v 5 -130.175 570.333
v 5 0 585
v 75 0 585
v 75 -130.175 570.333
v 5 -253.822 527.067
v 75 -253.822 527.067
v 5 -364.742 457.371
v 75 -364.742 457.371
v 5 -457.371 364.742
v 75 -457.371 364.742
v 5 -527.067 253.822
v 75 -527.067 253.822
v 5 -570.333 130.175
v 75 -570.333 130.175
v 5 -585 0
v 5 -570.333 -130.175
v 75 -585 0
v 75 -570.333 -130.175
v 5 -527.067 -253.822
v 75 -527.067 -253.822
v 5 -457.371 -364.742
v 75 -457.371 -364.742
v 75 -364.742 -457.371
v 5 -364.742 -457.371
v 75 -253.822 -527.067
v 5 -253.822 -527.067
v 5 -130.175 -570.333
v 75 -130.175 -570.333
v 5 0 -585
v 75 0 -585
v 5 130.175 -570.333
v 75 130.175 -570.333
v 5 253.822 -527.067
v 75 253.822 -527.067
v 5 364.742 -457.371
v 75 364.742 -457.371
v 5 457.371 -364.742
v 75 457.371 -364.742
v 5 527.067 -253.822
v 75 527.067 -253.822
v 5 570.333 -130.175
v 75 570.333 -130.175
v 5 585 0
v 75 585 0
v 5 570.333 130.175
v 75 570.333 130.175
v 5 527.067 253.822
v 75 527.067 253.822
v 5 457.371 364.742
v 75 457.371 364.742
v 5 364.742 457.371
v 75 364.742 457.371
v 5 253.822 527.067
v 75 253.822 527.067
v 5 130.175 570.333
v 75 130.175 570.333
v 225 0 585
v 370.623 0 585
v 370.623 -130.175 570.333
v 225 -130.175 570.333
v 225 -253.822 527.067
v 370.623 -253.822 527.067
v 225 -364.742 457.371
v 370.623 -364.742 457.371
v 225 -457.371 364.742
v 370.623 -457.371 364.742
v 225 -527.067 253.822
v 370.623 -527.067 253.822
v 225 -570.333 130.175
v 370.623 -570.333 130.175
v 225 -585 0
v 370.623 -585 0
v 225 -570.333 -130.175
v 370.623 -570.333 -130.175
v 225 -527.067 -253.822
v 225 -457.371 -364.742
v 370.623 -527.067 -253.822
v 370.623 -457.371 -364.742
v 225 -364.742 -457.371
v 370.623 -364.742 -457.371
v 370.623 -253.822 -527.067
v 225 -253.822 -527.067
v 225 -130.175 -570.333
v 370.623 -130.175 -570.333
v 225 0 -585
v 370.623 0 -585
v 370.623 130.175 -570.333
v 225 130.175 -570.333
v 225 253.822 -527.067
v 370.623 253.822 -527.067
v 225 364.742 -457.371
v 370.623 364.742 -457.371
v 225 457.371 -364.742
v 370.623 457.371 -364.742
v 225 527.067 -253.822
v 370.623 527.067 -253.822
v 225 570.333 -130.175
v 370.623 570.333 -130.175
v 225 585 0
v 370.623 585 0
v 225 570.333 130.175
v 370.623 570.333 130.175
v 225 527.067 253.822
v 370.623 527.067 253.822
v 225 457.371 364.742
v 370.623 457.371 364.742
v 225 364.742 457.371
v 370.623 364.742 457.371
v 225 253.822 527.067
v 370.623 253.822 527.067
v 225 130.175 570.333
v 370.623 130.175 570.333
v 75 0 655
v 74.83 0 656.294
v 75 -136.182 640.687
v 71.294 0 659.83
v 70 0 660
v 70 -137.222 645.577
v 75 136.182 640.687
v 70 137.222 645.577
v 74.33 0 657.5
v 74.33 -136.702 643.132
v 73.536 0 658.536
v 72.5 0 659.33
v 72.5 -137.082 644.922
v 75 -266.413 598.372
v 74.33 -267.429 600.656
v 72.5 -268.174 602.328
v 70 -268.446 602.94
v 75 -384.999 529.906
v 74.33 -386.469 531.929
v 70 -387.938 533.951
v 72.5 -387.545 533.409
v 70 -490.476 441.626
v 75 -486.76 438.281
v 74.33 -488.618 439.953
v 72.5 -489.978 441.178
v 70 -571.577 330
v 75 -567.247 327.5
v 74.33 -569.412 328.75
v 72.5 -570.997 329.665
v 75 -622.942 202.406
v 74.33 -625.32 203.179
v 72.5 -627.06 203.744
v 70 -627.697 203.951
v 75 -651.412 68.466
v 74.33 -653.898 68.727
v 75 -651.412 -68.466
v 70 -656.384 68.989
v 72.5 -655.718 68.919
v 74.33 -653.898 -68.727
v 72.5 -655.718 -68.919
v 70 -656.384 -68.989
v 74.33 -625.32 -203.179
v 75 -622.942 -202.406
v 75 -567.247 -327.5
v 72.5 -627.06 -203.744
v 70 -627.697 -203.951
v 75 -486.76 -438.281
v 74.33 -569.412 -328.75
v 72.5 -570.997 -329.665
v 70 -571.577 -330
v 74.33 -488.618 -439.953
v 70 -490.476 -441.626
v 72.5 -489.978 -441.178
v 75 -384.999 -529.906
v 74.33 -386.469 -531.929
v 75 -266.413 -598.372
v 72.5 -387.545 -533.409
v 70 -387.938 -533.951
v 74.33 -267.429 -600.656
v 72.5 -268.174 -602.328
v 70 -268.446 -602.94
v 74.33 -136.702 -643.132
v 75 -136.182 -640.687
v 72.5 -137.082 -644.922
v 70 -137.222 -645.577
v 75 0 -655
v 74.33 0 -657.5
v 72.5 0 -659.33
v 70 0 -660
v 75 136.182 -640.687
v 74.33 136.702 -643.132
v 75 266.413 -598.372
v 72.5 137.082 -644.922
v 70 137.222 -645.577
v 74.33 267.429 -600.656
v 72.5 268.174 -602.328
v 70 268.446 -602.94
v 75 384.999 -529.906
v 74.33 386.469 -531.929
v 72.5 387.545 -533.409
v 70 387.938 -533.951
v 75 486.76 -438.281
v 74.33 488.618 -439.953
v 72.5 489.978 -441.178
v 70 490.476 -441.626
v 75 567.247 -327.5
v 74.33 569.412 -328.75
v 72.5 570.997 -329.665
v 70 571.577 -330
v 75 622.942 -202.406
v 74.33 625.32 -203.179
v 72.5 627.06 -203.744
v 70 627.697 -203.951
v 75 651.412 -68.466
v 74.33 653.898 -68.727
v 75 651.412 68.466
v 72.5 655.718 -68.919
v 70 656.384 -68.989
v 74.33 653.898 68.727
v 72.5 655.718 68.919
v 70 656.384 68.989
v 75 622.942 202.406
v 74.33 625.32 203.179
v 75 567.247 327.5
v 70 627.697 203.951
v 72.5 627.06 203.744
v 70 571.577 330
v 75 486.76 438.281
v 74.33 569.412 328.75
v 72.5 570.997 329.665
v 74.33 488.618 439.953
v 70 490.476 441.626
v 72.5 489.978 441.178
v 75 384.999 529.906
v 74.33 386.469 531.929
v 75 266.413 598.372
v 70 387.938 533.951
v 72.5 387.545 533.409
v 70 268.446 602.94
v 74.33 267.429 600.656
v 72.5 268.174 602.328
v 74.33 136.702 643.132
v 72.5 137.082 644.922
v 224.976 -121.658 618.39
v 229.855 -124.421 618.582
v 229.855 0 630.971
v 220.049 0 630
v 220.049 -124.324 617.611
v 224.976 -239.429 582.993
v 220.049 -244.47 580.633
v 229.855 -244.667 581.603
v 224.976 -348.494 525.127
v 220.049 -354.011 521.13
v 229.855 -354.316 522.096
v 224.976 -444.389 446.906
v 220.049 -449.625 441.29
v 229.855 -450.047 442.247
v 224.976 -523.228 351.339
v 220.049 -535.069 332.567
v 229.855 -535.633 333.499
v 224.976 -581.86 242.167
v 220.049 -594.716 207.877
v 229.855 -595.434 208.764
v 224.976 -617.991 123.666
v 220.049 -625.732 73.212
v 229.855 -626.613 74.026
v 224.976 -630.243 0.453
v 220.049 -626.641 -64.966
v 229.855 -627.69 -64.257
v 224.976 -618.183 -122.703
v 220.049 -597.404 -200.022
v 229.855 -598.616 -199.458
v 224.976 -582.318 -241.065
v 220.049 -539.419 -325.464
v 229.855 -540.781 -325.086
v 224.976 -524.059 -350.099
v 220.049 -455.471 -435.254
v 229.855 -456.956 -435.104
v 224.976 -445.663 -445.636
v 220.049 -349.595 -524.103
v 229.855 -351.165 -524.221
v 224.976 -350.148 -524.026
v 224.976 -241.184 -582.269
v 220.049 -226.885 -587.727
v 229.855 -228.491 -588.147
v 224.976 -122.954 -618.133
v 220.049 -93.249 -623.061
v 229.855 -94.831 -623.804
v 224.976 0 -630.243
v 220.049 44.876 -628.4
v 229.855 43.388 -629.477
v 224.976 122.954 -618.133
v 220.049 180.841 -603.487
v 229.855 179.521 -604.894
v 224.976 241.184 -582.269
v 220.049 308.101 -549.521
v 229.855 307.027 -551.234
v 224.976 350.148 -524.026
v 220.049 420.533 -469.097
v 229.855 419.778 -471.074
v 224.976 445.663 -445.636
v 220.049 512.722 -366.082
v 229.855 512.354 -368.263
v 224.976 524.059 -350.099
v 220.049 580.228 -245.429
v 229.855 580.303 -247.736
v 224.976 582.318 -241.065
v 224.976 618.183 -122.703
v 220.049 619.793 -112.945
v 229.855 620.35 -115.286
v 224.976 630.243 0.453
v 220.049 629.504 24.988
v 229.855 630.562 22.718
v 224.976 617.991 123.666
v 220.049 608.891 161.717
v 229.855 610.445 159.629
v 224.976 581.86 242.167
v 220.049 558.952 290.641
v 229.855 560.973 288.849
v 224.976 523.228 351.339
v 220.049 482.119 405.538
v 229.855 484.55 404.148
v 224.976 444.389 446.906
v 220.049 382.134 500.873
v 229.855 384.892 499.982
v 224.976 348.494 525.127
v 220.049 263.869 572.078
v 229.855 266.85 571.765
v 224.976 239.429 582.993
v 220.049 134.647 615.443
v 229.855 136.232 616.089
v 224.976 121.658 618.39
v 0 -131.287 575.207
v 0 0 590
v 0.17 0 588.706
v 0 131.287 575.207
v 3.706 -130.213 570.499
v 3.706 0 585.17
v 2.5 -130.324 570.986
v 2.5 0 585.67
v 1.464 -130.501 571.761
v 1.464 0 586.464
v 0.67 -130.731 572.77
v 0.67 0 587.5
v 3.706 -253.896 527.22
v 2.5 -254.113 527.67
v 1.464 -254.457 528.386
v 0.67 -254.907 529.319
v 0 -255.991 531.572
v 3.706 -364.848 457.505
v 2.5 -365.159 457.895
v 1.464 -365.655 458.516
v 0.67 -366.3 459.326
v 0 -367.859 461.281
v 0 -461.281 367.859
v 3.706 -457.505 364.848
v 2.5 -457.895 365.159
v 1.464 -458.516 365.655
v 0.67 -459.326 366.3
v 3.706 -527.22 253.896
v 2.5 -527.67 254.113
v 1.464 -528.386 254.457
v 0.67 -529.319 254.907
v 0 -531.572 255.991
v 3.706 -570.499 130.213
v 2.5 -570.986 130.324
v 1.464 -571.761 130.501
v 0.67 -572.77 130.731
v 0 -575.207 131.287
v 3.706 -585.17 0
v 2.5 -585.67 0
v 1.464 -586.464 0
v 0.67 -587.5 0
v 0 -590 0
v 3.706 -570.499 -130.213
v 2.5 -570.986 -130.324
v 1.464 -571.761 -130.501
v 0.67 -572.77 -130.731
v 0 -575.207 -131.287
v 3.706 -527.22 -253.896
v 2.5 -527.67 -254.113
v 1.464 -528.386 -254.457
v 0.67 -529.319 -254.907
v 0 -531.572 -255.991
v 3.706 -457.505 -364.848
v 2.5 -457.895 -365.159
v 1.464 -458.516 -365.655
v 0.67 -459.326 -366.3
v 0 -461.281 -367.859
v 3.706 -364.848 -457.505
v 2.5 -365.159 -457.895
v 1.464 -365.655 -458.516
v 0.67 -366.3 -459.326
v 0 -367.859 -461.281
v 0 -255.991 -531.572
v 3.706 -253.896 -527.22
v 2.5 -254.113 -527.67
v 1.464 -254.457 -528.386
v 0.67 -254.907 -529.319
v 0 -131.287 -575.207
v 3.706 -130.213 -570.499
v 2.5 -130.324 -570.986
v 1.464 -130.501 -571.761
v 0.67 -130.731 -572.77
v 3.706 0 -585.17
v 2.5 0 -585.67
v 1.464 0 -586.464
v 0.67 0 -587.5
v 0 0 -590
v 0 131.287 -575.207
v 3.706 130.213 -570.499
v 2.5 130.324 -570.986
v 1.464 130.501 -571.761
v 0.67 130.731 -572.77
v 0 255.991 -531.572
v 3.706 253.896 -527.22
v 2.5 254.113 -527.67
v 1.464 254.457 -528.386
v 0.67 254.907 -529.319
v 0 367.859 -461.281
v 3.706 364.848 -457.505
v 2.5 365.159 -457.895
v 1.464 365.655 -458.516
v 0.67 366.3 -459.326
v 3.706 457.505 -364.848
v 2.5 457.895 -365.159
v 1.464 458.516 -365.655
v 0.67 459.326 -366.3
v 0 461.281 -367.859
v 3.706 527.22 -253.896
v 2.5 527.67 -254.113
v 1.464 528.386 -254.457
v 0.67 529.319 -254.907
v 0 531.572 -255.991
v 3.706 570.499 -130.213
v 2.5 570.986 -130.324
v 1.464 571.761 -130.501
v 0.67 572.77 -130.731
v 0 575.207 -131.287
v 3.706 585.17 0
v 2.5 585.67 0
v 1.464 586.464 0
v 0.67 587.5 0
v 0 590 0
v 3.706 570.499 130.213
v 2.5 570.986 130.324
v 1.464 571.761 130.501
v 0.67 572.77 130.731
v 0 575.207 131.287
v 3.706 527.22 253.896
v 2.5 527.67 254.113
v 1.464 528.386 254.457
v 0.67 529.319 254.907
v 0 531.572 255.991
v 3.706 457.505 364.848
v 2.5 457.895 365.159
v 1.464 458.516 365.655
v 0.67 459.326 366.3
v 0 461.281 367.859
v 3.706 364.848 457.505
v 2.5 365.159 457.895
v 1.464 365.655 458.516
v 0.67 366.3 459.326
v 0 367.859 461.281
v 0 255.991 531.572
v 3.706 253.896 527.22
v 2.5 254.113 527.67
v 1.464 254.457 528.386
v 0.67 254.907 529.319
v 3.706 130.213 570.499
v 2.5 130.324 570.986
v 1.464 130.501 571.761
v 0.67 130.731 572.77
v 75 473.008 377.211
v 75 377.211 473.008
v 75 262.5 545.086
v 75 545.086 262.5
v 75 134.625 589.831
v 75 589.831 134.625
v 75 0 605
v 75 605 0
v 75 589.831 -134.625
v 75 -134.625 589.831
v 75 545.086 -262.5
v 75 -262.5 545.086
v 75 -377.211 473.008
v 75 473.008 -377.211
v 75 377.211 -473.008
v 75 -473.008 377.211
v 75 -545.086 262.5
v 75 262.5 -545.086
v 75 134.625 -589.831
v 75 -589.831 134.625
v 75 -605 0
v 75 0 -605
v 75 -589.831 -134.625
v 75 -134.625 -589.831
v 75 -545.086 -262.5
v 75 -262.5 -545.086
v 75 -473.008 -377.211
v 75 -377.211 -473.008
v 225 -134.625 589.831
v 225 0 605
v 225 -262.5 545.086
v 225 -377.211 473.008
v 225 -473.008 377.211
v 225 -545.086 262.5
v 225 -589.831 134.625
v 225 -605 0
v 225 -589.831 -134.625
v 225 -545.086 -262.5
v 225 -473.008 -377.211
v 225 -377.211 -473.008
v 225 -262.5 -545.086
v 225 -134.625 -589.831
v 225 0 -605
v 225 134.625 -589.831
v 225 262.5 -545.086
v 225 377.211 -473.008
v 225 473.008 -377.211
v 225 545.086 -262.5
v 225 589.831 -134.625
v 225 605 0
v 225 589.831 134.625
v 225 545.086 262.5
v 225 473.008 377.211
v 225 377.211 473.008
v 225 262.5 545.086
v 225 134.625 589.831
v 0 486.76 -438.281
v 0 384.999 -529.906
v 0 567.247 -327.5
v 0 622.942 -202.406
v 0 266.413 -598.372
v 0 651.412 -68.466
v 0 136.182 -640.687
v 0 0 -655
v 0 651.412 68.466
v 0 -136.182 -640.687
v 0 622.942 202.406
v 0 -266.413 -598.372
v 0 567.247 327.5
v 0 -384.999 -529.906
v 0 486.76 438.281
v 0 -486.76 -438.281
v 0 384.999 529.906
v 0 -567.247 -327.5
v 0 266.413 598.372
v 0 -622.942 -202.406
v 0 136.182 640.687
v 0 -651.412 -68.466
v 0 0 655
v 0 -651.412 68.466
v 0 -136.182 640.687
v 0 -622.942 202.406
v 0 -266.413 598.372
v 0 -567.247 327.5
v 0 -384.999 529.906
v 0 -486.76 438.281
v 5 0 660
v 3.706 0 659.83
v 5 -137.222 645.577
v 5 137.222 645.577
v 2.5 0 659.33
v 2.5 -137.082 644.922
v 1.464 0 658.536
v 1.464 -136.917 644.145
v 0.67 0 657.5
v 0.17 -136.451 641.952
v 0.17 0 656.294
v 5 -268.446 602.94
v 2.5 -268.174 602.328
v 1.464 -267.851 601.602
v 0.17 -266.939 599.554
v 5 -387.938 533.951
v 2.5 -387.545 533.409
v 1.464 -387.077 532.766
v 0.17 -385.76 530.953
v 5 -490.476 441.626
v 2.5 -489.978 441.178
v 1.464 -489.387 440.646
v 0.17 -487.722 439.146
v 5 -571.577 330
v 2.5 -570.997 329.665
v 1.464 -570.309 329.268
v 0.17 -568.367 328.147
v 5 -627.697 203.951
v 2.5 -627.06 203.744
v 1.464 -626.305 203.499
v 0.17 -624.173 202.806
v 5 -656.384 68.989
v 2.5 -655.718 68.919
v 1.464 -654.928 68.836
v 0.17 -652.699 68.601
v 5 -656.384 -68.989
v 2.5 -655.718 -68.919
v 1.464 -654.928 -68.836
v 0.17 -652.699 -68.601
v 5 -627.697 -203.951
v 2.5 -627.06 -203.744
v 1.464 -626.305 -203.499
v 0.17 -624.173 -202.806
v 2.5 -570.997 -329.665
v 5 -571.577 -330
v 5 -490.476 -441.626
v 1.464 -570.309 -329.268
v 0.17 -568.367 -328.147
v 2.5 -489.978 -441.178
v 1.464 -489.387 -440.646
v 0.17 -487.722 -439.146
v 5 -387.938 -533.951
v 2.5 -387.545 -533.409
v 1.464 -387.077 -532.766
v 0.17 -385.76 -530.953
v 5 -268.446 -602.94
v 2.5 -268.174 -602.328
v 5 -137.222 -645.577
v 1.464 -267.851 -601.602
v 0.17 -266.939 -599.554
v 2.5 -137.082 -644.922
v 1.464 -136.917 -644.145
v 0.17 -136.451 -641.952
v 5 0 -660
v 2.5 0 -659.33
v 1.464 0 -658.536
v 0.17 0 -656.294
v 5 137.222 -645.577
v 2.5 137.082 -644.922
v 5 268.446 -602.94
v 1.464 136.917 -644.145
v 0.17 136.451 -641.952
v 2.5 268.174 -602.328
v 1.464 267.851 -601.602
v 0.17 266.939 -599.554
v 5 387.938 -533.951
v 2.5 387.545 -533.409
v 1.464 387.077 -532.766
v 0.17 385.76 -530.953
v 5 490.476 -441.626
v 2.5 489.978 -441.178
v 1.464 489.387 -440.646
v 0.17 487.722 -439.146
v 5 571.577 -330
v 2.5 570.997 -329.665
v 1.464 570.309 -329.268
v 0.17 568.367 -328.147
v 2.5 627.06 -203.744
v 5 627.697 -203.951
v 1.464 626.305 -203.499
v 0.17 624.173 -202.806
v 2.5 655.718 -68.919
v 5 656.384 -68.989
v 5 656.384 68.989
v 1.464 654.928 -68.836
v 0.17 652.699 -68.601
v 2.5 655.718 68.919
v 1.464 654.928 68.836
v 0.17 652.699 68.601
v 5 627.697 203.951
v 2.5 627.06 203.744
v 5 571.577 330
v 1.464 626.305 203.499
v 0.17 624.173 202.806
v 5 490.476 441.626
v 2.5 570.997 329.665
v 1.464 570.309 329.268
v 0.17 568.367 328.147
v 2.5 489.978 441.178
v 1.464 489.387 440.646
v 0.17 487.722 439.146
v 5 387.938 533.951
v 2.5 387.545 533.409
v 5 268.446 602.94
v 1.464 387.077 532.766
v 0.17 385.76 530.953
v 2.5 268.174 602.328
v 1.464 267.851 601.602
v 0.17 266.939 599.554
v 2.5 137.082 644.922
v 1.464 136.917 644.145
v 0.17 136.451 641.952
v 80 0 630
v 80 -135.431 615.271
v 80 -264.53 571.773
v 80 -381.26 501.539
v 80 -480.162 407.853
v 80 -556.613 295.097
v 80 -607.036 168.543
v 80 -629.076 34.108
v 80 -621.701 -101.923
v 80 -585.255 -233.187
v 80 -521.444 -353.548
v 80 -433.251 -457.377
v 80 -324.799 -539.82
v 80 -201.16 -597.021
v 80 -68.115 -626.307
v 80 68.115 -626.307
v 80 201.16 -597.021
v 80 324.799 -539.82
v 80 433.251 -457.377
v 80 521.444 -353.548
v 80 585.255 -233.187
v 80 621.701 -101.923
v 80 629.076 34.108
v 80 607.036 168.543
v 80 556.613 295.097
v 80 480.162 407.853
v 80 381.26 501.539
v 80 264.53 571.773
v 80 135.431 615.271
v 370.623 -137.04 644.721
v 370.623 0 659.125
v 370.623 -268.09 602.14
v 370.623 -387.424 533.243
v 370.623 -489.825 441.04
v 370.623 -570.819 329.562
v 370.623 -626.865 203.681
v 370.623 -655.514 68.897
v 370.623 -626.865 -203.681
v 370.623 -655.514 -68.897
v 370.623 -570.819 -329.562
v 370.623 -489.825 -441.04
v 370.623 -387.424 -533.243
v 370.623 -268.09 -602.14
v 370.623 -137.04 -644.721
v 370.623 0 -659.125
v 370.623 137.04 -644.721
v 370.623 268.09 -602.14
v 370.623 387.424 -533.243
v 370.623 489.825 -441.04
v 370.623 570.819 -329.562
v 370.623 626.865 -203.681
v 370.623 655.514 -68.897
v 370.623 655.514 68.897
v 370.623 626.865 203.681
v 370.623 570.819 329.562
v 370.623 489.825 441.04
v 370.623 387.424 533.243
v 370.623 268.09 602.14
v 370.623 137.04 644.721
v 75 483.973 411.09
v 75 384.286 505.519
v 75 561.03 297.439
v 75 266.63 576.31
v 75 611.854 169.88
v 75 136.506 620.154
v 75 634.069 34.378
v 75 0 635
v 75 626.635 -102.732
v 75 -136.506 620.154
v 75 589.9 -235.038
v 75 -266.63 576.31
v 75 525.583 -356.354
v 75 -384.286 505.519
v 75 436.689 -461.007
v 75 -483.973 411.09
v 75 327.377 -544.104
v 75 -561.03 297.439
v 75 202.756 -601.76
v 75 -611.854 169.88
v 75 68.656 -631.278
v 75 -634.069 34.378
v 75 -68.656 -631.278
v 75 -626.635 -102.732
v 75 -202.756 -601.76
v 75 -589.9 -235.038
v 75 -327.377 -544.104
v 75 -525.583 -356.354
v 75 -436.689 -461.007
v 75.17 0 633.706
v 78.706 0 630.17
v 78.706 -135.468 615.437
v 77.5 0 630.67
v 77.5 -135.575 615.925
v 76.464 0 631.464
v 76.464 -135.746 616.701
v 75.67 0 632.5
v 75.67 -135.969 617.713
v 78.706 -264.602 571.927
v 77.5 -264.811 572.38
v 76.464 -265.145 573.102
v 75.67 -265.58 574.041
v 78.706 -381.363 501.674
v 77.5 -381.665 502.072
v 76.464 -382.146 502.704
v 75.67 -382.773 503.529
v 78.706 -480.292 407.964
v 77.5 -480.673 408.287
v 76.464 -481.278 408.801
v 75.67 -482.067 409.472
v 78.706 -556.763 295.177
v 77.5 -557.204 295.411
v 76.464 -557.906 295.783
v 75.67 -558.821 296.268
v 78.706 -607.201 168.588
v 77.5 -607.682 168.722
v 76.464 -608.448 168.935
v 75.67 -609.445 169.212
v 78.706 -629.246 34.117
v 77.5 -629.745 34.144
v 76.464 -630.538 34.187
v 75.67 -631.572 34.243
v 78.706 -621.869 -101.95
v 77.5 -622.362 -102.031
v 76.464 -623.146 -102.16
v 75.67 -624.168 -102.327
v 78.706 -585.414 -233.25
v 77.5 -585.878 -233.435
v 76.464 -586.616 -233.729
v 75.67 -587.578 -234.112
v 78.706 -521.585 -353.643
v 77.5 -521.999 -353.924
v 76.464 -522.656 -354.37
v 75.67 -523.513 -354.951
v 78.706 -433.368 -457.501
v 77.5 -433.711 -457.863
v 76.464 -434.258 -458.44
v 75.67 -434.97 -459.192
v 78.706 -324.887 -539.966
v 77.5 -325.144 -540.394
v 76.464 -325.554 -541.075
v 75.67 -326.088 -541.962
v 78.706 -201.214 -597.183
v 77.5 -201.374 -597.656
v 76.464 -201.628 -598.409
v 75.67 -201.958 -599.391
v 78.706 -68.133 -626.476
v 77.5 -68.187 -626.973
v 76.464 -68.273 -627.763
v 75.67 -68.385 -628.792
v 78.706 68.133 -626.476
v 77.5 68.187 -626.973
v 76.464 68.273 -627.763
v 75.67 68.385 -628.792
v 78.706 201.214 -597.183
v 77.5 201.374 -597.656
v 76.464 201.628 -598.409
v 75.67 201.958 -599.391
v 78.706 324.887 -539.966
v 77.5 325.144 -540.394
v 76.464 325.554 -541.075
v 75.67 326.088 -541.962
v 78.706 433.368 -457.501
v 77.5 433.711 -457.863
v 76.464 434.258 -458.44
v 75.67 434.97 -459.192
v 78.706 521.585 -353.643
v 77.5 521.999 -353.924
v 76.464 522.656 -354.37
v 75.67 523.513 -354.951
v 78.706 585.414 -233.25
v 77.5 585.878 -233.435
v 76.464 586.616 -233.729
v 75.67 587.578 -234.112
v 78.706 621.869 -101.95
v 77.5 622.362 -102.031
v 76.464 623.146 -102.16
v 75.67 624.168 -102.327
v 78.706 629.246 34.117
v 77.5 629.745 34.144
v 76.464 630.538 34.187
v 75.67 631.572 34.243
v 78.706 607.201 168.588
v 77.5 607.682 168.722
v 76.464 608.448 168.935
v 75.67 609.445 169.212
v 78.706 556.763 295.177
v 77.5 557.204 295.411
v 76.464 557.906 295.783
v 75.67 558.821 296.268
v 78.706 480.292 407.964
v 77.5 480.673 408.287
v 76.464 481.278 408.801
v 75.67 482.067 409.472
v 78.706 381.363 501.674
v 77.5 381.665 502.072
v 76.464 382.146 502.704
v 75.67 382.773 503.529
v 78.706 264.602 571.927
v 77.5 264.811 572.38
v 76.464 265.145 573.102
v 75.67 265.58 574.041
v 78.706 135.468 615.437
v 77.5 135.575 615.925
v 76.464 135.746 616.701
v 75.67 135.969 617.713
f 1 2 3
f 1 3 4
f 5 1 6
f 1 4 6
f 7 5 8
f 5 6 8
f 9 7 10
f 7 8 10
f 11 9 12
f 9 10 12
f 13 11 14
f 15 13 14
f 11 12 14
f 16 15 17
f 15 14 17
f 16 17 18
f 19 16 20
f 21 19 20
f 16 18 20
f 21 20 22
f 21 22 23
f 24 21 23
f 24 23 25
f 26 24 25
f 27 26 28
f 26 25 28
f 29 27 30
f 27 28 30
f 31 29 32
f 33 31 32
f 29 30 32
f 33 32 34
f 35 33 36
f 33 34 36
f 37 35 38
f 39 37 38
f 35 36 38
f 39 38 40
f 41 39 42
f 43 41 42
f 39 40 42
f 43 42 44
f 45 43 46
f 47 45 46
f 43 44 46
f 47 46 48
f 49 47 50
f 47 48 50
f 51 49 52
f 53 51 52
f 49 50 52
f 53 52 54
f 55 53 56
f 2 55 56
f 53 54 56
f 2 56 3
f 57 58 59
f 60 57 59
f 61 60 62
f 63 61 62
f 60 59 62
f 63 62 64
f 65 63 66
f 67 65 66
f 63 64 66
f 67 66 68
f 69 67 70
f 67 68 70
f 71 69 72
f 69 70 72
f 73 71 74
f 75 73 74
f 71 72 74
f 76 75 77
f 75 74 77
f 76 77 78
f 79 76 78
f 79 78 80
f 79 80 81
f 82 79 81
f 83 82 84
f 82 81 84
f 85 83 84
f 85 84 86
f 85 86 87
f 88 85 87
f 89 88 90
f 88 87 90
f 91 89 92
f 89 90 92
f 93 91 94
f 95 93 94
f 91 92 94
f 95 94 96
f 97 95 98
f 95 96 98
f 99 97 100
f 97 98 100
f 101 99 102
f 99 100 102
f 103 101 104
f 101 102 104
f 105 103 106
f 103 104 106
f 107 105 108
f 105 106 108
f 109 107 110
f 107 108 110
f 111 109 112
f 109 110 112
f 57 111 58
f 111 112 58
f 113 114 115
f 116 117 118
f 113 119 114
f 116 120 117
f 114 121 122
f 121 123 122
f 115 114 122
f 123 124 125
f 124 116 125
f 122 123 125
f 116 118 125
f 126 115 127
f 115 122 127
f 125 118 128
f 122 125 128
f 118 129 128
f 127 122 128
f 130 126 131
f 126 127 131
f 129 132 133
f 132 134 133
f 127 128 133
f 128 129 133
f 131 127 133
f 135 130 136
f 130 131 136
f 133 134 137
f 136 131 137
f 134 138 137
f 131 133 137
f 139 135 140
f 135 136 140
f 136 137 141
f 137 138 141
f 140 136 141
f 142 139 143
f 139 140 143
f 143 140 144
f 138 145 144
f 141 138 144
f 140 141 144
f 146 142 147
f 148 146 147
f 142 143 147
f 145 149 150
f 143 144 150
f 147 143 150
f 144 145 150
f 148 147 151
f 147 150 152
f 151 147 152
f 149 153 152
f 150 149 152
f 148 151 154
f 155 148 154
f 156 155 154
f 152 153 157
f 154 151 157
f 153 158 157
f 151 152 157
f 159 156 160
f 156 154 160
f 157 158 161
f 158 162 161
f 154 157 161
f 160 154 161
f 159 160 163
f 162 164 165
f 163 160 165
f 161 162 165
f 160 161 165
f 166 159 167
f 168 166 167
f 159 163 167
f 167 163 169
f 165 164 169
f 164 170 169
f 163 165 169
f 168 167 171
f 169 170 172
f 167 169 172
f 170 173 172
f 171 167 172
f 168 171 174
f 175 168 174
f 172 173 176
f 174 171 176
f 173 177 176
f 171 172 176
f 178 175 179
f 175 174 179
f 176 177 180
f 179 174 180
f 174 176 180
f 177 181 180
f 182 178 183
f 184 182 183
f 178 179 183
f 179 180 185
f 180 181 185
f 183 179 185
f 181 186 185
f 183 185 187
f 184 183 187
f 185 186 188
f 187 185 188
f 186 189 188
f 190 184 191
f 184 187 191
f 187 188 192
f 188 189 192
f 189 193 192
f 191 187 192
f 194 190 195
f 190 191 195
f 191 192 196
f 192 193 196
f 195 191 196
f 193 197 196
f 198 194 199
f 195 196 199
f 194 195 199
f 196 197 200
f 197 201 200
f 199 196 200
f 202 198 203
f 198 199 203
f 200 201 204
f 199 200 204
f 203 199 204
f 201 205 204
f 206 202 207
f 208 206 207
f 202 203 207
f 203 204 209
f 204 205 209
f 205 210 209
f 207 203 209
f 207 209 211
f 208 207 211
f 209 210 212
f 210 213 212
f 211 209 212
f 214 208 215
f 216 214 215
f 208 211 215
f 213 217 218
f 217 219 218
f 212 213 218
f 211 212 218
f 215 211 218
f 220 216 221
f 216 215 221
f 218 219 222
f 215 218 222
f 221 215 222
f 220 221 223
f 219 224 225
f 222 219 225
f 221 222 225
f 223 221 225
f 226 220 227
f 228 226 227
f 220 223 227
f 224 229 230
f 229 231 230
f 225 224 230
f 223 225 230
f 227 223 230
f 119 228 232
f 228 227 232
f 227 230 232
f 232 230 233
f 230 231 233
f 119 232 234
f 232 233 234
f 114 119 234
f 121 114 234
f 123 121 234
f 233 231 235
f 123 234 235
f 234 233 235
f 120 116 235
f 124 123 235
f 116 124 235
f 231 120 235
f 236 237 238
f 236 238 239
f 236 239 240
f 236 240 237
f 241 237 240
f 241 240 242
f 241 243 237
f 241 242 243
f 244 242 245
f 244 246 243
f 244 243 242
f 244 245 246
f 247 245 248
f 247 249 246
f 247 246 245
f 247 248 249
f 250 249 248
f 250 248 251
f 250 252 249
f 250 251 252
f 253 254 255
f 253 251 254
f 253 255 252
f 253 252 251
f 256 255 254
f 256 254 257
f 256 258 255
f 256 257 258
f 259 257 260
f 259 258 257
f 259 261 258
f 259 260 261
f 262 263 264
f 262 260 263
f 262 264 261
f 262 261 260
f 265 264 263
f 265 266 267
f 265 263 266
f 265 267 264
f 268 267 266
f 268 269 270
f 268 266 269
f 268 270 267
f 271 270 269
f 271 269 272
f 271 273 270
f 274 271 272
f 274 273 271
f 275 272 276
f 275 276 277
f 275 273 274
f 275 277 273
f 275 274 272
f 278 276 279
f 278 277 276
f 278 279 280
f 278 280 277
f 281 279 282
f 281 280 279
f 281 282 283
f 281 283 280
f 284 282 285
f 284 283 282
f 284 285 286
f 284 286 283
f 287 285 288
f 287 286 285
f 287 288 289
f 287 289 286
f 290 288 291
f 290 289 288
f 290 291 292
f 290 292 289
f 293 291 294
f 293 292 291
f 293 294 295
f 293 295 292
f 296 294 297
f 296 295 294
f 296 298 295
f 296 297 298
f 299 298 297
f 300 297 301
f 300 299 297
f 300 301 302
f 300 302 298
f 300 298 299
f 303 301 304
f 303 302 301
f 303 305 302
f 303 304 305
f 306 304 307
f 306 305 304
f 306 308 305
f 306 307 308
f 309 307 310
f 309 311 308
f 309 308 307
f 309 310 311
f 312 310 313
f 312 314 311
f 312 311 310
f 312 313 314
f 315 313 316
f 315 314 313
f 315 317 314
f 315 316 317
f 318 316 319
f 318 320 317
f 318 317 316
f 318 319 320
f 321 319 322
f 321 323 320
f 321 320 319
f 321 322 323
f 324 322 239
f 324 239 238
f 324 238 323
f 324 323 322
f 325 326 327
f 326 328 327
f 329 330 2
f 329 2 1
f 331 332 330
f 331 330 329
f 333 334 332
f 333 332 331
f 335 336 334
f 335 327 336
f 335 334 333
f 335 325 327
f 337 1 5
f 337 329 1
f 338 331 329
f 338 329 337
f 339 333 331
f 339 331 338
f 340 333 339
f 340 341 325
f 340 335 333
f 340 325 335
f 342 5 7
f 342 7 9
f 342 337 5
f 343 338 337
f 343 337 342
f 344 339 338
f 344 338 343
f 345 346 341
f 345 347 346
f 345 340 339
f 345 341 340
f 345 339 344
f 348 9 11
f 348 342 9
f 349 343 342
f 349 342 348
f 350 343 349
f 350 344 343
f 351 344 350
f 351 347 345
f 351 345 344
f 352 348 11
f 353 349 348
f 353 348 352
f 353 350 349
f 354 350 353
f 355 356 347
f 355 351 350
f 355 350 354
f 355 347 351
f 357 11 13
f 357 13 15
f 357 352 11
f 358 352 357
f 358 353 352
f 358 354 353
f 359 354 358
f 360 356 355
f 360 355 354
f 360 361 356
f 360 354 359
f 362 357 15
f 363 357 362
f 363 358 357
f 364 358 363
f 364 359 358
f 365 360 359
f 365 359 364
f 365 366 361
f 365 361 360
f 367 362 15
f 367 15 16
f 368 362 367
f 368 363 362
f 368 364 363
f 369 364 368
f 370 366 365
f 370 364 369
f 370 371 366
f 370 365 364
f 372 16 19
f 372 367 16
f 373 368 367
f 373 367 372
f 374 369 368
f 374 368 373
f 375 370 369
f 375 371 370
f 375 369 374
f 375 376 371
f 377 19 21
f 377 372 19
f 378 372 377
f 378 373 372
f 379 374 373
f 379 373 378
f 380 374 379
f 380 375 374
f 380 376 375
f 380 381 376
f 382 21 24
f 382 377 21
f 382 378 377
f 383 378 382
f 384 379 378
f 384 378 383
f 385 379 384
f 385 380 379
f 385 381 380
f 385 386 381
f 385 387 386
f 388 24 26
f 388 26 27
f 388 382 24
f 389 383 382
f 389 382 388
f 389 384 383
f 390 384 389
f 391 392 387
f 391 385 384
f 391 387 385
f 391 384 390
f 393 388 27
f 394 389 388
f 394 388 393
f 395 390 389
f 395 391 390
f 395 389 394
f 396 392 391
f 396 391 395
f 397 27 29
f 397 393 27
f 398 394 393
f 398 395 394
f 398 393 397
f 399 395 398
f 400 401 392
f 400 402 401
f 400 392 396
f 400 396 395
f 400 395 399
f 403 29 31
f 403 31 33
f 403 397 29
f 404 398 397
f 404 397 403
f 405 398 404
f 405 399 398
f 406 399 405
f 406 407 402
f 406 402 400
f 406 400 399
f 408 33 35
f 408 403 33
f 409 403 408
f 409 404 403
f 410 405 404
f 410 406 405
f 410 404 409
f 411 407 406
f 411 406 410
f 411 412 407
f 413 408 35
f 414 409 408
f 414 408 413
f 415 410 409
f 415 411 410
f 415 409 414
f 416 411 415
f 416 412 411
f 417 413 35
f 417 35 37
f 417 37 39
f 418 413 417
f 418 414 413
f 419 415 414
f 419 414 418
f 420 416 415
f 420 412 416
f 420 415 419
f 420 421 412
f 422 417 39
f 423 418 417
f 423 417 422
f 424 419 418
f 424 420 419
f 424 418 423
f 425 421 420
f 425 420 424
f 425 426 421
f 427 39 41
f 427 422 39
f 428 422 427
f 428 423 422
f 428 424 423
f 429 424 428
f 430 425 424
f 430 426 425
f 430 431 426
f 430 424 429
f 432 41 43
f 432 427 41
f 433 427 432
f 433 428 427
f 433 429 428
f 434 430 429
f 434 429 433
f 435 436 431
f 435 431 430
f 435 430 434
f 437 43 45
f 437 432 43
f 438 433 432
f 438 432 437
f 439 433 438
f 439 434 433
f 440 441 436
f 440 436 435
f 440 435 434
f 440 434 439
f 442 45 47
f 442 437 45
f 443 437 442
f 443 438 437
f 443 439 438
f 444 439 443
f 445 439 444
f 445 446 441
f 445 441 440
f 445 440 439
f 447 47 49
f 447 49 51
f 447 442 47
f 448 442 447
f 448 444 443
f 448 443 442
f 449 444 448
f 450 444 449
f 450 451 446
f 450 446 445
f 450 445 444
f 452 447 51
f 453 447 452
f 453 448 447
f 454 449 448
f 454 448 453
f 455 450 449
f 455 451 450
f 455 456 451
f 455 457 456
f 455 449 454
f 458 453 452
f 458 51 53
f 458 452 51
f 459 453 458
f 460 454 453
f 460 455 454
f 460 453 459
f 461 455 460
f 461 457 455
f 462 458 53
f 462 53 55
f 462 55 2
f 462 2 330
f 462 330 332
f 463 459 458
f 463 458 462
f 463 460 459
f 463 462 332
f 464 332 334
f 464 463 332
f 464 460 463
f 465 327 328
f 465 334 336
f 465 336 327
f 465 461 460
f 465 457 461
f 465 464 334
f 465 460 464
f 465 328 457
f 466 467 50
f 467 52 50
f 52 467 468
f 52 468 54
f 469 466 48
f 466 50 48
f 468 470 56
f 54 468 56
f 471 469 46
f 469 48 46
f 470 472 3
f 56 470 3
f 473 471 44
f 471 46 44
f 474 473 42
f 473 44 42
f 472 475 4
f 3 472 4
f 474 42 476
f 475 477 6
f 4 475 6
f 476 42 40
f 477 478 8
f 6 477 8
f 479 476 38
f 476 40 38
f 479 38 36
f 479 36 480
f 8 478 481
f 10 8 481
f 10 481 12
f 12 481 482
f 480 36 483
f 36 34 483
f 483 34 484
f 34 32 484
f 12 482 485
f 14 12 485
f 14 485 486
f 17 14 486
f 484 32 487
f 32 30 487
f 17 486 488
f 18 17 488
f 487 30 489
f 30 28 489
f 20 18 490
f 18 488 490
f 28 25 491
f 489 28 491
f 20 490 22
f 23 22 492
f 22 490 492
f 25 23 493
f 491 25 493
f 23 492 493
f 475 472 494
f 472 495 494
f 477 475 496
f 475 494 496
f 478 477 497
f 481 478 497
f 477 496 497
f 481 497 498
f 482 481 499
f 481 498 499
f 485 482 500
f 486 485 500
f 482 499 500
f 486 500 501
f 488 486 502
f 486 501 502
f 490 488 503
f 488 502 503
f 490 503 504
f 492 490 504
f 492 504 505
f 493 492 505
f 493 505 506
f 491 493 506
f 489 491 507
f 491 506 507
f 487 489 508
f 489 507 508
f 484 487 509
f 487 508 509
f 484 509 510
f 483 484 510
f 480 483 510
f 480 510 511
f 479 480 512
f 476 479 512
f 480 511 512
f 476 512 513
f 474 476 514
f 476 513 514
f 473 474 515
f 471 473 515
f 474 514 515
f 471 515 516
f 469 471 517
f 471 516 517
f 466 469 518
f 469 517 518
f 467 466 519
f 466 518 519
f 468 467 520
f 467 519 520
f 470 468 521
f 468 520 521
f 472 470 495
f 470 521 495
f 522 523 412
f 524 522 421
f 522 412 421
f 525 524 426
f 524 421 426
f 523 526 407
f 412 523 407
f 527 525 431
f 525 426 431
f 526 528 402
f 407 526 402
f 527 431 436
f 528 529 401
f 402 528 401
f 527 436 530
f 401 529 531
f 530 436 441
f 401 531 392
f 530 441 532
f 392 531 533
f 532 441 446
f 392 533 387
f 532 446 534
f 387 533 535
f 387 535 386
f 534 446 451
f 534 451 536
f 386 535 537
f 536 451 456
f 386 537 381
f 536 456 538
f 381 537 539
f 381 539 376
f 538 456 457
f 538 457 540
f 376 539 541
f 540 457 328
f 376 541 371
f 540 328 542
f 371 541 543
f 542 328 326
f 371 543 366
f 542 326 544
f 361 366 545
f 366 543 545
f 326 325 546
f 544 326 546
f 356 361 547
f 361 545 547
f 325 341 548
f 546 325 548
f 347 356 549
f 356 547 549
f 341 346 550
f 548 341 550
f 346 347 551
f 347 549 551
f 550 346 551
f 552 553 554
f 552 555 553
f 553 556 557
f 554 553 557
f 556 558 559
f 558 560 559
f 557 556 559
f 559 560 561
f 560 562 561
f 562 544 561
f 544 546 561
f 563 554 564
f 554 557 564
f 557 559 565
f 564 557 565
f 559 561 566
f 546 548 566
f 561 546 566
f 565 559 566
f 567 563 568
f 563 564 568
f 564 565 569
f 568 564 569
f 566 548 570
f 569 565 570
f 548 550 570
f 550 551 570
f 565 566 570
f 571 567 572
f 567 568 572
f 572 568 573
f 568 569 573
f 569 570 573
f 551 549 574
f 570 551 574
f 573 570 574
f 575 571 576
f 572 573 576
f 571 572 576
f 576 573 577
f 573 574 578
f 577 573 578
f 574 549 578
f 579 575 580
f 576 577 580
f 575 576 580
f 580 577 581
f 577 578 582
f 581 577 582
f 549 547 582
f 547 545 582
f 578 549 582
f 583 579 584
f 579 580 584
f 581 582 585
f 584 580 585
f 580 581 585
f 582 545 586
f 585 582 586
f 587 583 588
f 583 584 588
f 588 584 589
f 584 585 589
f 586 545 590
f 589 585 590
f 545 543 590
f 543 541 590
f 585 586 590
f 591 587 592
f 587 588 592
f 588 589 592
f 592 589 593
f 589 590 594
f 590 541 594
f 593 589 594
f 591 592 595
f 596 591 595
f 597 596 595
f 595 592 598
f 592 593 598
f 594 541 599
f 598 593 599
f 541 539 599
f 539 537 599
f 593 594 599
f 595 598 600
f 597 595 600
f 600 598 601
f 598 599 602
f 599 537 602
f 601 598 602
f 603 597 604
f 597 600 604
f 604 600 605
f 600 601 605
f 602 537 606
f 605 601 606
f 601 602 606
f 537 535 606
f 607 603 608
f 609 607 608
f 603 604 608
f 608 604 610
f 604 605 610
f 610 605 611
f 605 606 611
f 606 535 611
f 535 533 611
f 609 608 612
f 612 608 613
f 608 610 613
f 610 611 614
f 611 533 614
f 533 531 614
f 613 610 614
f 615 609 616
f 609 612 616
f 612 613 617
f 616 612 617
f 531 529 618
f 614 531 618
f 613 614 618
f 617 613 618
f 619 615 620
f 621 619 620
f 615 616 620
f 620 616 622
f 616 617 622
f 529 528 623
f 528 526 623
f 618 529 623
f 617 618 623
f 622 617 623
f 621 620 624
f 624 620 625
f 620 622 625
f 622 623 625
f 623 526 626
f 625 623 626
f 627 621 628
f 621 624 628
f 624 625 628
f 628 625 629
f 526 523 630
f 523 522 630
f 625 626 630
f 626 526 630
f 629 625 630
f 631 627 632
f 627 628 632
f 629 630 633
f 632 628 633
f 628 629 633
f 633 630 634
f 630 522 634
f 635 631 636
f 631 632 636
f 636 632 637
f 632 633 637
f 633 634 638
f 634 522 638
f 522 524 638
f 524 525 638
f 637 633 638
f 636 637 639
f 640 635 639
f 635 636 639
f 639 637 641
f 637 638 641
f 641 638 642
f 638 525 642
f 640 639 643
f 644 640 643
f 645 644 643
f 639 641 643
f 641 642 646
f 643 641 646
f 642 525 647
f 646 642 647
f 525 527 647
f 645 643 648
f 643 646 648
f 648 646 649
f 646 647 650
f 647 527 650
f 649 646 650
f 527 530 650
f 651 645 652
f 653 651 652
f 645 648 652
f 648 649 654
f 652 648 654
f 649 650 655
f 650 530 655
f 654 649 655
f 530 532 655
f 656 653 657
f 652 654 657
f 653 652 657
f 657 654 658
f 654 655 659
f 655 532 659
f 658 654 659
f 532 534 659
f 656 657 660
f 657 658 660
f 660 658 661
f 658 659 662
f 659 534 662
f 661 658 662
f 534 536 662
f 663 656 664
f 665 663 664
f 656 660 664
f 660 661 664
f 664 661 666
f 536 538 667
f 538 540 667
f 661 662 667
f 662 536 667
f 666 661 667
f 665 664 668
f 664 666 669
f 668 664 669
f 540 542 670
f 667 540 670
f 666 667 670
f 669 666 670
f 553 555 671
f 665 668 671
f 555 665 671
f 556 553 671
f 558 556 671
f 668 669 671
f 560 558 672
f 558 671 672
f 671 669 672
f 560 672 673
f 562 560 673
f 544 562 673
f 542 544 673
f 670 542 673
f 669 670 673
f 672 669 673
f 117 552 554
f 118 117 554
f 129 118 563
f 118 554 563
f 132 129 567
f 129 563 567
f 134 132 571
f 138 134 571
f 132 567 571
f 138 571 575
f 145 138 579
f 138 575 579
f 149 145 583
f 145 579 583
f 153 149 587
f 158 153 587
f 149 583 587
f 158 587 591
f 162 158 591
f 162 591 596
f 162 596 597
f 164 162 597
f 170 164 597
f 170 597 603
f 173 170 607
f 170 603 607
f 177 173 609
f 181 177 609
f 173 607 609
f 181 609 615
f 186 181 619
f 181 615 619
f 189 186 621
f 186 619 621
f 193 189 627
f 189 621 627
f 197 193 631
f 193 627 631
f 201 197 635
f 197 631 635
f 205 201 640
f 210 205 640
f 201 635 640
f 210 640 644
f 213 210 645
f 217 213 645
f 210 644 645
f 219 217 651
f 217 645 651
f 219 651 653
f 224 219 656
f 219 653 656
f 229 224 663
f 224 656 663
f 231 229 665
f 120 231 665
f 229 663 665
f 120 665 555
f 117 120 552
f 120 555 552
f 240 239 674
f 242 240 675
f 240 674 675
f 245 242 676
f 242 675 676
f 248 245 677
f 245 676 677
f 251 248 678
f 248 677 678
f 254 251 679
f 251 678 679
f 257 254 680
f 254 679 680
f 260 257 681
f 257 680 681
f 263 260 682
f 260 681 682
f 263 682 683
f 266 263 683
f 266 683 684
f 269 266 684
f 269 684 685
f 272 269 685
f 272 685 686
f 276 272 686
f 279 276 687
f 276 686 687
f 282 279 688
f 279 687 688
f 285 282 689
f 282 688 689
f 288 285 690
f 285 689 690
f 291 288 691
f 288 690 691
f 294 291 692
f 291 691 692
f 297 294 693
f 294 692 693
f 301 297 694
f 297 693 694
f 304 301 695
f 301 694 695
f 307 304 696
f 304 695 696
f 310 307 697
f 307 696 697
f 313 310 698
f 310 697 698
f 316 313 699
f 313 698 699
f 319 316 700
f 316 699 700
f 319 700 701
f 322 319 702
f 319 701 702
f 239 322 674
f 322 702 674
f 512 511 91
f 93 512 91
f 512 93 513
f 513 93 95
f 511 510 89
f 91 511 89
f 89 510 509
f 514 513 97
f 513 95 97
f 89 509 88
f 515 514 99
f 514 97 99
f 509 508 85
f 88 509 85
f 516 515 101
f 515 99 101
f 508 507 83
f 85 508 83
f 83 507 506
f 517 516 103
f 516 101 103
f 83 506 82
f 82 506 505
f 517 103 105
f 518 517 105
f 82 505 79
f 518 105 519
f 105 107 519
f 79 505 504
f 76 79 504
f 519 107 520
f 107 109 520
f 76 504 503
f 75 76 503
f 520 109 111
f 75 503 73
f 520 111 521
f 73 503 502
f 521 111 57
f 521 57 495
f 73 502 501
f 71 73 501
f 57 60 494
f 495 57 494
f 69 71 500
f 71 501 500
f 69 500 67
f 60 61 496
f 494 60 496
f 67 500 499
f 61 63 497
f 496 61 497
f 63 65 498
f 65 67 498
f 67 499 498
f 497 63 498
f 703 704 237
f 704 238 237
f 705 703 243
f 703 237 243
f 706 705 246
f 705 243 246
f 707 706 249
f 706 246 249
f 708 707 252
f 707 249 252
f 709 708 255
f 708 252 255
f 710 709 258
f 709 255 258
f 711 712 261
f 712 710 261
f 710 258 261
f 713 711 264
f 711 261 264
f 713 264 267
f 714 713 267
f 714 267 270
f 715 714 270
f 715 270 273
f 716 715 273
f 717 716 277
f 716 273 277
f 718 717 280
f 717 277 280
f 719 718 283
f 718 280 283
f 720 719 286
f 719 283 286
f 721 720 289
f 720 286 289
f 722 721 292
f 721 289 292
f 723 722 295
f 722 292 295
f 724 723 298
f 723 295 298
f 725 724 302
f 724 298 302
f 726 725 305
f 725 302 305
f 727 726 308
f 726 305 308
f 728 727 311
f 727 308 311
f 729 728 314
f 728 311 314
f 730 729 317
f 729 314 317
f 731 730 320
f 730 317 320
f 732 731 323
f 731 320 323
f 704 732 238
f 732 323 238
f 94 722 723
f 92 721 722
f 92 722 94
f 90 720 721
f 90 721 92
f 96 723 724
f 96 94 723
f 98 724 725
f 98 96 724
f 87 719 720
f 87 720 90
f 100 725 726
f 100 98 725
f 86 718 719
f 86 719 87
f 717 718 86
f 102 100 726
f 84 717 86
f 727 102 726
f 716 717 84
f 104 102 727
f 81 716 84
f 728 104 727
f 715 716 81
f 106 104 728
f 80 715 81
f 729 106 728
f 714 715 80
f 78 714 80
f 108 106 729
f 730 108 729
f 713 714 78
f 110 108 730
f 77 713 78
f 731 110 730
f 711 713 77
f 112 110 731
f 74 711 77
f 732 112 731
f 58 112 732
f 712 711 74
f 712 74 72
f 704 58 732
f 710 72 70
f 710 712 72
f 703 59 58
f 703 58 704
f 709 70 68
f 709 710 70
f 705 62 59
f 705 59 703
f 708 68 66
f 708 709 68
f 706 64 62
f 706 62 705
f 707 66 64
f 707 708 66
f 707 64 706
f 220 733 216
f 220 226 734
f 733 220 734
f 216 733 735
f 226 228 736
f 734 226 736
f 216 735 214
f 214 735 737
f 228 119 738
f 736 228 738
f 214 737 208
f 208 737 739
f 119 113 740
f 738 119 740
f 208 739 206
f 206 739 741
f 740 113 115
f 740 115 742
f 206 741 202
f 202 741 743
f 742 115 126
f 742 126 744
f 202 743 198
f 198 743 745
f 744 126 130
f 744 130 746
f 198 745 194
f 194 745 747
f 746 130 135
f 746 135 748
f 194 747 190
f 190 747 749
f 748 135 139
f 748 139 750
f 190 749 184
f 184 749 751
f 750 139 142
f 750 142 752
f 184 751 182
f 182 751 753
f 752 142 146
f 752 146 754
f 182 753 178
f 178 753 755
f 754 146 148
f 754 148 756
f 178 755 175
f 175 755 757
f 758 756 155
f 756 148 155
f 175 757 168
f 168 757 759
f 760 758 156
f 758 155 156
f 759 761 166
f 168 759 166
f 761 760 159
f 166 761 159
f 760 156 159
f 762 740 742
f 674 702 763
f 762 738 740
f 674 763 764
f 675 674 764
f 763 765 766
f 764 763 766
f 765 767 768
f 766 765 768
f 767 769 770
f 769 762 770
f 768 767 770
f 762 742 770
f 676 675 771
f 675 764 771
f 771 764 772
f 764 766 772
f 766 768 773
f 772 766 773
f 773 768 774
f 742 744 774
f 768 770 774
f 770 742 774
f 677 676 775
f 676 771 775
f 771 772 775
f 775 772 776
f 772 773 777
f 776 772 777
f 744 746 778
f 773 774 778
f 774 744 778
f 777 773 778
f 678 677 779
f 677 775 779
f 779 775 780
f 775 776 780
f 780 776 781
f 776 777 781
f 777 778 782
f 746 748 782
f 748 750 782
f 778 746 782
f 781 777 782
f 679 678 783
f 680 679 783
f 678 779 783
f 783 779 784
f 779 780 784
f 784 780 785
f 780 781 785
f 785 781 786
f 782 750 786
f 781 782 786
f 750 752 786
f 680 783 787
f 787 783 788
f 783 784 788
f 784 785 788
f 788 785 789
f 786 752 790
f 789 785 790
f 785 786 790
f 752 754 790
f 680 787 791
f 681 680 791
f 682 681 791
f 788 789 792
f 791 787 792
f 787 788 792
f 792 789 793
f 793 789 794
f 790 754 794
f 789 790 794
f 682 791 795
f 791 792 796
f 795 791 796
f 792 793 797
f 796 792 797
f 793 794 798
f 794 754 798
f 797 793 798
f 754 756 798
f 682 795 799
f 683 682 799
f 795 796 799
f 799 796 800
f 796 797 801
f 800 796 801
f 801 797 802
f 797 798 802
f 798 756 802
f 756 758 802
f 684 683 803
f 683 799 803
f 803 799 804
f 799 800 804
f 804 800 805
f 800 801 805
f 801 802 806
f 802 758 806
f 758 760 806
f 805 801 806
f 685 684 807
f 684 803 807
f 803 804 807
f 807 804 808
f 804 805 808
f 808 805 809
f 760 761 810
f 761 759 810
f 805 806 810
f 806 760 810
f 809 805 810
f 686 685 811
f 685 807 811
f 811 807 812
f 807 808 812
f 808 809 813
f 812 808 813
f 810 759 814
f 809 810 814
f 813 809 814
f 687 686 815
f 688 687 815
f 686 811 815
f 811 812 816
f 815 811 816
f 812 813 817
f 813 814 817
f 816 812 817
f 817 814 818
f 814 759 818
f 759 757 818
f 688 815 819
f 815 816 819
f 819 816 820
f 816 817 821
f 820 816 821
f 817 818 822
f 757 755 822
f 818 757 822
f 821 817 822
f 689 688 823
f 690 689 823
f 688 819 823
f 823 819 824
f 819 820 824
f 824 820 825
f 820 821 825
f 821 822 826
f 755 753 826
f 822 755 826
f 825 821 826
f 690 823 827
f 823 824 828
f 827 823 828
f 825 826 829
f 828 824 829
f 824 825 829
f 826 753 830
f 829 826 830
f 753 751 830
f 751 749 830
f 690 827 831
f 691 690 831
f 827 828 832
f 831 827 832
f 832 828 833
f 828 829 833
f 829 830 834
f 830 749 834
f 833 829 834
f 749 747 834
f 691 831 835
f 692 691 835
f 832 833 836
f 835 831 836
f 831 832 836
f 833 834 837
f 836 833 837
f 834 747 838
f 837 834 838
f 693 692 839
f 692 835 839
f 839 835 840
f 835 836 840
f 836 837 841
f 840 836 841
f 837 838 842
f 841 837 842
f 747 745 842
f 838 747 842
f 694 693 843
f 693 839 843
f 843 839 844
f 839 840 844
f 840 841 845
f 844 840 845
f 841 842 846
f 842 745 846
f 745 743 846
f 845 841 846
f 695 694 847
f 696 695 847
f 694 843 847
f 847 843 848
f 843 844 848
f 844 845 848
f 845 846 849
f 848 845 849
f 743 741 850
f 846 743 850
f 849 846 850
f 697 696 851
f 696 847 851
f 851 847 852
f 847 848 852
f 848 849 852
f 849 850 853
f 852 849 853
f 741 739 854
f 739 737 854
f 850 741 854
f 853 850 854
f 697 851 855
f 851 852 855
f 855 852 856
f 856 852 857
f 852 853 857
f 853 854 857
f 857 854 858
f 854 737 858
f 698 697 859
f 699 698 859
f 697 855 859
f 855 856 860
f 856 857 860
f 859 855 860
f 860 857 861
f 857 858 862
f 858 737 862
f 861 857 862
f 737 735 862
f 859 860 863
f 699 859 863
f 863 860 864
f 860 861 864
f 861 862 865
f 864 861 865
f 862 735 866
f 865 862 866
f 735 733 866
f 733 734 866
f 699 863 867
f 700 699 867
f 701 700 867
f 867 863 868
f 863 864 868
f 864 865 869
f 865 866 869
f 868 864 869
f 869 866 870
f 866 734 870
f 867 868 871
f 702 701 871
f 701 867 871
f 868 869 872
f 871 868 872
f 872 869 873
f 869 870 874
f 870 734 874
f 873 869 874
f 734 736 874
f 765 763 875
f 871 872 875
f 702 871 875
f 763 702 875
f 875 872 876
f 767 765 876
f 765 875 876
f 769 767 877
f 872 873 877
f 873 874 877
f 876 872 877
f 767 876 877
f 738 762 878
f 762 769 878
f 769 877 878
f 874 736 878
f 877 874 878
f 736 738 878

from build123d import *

# Parameters (mm, degrees)
F3_R     = 50
F4_R     = 5
F5_W     = 906.862557
F5_H     = 1744.742334
F6_DEPTH = 1000


with BuildPart() as f2:
    # F0 (on Front) → F2 (revolve)
    with BuildSketch(Plane.XZ):
        Polygon((75, 660), (0, 660), (0, 585), (75, 585), (75, 605), (225, 605), (225, 585), (1070, 585), (1070, 685), (500, 685), (225, 630), (75, 630), align=None)
    revolve(axis=Axis((388.548315, 0, 0), (1, 0, 0)))

    # F3
    f3_edges = [f2.edges().sort_by_distance(p)[0] for p in [
        (500, 0, -685),
        (225, 0, -630),
    ]]
    fillet(f3_edges, radius=F3_R)

    # F4
    f4_edges = [f2.edges().sort_by_distance(p)[0] for p in [
        (75, 0, -660),
        (75, 0, -630),
        (0, 0, -660),
        (0, 0, -585),
        (1070, 0, -685),
    ]]
    fillet(f4_edges, radius=F4_R)

    # F5 (on Front) → F6 (cut, symmetric)
    with BuildSketch(Plane.XZ):
        with Locations((824.053854, 4.612178)):
            Rectangle(F5_W, F5_H)
    extrude(amount=F6_DEPTH, both=True, mode=Mode.SUBTRACT)


solid = f2.part
